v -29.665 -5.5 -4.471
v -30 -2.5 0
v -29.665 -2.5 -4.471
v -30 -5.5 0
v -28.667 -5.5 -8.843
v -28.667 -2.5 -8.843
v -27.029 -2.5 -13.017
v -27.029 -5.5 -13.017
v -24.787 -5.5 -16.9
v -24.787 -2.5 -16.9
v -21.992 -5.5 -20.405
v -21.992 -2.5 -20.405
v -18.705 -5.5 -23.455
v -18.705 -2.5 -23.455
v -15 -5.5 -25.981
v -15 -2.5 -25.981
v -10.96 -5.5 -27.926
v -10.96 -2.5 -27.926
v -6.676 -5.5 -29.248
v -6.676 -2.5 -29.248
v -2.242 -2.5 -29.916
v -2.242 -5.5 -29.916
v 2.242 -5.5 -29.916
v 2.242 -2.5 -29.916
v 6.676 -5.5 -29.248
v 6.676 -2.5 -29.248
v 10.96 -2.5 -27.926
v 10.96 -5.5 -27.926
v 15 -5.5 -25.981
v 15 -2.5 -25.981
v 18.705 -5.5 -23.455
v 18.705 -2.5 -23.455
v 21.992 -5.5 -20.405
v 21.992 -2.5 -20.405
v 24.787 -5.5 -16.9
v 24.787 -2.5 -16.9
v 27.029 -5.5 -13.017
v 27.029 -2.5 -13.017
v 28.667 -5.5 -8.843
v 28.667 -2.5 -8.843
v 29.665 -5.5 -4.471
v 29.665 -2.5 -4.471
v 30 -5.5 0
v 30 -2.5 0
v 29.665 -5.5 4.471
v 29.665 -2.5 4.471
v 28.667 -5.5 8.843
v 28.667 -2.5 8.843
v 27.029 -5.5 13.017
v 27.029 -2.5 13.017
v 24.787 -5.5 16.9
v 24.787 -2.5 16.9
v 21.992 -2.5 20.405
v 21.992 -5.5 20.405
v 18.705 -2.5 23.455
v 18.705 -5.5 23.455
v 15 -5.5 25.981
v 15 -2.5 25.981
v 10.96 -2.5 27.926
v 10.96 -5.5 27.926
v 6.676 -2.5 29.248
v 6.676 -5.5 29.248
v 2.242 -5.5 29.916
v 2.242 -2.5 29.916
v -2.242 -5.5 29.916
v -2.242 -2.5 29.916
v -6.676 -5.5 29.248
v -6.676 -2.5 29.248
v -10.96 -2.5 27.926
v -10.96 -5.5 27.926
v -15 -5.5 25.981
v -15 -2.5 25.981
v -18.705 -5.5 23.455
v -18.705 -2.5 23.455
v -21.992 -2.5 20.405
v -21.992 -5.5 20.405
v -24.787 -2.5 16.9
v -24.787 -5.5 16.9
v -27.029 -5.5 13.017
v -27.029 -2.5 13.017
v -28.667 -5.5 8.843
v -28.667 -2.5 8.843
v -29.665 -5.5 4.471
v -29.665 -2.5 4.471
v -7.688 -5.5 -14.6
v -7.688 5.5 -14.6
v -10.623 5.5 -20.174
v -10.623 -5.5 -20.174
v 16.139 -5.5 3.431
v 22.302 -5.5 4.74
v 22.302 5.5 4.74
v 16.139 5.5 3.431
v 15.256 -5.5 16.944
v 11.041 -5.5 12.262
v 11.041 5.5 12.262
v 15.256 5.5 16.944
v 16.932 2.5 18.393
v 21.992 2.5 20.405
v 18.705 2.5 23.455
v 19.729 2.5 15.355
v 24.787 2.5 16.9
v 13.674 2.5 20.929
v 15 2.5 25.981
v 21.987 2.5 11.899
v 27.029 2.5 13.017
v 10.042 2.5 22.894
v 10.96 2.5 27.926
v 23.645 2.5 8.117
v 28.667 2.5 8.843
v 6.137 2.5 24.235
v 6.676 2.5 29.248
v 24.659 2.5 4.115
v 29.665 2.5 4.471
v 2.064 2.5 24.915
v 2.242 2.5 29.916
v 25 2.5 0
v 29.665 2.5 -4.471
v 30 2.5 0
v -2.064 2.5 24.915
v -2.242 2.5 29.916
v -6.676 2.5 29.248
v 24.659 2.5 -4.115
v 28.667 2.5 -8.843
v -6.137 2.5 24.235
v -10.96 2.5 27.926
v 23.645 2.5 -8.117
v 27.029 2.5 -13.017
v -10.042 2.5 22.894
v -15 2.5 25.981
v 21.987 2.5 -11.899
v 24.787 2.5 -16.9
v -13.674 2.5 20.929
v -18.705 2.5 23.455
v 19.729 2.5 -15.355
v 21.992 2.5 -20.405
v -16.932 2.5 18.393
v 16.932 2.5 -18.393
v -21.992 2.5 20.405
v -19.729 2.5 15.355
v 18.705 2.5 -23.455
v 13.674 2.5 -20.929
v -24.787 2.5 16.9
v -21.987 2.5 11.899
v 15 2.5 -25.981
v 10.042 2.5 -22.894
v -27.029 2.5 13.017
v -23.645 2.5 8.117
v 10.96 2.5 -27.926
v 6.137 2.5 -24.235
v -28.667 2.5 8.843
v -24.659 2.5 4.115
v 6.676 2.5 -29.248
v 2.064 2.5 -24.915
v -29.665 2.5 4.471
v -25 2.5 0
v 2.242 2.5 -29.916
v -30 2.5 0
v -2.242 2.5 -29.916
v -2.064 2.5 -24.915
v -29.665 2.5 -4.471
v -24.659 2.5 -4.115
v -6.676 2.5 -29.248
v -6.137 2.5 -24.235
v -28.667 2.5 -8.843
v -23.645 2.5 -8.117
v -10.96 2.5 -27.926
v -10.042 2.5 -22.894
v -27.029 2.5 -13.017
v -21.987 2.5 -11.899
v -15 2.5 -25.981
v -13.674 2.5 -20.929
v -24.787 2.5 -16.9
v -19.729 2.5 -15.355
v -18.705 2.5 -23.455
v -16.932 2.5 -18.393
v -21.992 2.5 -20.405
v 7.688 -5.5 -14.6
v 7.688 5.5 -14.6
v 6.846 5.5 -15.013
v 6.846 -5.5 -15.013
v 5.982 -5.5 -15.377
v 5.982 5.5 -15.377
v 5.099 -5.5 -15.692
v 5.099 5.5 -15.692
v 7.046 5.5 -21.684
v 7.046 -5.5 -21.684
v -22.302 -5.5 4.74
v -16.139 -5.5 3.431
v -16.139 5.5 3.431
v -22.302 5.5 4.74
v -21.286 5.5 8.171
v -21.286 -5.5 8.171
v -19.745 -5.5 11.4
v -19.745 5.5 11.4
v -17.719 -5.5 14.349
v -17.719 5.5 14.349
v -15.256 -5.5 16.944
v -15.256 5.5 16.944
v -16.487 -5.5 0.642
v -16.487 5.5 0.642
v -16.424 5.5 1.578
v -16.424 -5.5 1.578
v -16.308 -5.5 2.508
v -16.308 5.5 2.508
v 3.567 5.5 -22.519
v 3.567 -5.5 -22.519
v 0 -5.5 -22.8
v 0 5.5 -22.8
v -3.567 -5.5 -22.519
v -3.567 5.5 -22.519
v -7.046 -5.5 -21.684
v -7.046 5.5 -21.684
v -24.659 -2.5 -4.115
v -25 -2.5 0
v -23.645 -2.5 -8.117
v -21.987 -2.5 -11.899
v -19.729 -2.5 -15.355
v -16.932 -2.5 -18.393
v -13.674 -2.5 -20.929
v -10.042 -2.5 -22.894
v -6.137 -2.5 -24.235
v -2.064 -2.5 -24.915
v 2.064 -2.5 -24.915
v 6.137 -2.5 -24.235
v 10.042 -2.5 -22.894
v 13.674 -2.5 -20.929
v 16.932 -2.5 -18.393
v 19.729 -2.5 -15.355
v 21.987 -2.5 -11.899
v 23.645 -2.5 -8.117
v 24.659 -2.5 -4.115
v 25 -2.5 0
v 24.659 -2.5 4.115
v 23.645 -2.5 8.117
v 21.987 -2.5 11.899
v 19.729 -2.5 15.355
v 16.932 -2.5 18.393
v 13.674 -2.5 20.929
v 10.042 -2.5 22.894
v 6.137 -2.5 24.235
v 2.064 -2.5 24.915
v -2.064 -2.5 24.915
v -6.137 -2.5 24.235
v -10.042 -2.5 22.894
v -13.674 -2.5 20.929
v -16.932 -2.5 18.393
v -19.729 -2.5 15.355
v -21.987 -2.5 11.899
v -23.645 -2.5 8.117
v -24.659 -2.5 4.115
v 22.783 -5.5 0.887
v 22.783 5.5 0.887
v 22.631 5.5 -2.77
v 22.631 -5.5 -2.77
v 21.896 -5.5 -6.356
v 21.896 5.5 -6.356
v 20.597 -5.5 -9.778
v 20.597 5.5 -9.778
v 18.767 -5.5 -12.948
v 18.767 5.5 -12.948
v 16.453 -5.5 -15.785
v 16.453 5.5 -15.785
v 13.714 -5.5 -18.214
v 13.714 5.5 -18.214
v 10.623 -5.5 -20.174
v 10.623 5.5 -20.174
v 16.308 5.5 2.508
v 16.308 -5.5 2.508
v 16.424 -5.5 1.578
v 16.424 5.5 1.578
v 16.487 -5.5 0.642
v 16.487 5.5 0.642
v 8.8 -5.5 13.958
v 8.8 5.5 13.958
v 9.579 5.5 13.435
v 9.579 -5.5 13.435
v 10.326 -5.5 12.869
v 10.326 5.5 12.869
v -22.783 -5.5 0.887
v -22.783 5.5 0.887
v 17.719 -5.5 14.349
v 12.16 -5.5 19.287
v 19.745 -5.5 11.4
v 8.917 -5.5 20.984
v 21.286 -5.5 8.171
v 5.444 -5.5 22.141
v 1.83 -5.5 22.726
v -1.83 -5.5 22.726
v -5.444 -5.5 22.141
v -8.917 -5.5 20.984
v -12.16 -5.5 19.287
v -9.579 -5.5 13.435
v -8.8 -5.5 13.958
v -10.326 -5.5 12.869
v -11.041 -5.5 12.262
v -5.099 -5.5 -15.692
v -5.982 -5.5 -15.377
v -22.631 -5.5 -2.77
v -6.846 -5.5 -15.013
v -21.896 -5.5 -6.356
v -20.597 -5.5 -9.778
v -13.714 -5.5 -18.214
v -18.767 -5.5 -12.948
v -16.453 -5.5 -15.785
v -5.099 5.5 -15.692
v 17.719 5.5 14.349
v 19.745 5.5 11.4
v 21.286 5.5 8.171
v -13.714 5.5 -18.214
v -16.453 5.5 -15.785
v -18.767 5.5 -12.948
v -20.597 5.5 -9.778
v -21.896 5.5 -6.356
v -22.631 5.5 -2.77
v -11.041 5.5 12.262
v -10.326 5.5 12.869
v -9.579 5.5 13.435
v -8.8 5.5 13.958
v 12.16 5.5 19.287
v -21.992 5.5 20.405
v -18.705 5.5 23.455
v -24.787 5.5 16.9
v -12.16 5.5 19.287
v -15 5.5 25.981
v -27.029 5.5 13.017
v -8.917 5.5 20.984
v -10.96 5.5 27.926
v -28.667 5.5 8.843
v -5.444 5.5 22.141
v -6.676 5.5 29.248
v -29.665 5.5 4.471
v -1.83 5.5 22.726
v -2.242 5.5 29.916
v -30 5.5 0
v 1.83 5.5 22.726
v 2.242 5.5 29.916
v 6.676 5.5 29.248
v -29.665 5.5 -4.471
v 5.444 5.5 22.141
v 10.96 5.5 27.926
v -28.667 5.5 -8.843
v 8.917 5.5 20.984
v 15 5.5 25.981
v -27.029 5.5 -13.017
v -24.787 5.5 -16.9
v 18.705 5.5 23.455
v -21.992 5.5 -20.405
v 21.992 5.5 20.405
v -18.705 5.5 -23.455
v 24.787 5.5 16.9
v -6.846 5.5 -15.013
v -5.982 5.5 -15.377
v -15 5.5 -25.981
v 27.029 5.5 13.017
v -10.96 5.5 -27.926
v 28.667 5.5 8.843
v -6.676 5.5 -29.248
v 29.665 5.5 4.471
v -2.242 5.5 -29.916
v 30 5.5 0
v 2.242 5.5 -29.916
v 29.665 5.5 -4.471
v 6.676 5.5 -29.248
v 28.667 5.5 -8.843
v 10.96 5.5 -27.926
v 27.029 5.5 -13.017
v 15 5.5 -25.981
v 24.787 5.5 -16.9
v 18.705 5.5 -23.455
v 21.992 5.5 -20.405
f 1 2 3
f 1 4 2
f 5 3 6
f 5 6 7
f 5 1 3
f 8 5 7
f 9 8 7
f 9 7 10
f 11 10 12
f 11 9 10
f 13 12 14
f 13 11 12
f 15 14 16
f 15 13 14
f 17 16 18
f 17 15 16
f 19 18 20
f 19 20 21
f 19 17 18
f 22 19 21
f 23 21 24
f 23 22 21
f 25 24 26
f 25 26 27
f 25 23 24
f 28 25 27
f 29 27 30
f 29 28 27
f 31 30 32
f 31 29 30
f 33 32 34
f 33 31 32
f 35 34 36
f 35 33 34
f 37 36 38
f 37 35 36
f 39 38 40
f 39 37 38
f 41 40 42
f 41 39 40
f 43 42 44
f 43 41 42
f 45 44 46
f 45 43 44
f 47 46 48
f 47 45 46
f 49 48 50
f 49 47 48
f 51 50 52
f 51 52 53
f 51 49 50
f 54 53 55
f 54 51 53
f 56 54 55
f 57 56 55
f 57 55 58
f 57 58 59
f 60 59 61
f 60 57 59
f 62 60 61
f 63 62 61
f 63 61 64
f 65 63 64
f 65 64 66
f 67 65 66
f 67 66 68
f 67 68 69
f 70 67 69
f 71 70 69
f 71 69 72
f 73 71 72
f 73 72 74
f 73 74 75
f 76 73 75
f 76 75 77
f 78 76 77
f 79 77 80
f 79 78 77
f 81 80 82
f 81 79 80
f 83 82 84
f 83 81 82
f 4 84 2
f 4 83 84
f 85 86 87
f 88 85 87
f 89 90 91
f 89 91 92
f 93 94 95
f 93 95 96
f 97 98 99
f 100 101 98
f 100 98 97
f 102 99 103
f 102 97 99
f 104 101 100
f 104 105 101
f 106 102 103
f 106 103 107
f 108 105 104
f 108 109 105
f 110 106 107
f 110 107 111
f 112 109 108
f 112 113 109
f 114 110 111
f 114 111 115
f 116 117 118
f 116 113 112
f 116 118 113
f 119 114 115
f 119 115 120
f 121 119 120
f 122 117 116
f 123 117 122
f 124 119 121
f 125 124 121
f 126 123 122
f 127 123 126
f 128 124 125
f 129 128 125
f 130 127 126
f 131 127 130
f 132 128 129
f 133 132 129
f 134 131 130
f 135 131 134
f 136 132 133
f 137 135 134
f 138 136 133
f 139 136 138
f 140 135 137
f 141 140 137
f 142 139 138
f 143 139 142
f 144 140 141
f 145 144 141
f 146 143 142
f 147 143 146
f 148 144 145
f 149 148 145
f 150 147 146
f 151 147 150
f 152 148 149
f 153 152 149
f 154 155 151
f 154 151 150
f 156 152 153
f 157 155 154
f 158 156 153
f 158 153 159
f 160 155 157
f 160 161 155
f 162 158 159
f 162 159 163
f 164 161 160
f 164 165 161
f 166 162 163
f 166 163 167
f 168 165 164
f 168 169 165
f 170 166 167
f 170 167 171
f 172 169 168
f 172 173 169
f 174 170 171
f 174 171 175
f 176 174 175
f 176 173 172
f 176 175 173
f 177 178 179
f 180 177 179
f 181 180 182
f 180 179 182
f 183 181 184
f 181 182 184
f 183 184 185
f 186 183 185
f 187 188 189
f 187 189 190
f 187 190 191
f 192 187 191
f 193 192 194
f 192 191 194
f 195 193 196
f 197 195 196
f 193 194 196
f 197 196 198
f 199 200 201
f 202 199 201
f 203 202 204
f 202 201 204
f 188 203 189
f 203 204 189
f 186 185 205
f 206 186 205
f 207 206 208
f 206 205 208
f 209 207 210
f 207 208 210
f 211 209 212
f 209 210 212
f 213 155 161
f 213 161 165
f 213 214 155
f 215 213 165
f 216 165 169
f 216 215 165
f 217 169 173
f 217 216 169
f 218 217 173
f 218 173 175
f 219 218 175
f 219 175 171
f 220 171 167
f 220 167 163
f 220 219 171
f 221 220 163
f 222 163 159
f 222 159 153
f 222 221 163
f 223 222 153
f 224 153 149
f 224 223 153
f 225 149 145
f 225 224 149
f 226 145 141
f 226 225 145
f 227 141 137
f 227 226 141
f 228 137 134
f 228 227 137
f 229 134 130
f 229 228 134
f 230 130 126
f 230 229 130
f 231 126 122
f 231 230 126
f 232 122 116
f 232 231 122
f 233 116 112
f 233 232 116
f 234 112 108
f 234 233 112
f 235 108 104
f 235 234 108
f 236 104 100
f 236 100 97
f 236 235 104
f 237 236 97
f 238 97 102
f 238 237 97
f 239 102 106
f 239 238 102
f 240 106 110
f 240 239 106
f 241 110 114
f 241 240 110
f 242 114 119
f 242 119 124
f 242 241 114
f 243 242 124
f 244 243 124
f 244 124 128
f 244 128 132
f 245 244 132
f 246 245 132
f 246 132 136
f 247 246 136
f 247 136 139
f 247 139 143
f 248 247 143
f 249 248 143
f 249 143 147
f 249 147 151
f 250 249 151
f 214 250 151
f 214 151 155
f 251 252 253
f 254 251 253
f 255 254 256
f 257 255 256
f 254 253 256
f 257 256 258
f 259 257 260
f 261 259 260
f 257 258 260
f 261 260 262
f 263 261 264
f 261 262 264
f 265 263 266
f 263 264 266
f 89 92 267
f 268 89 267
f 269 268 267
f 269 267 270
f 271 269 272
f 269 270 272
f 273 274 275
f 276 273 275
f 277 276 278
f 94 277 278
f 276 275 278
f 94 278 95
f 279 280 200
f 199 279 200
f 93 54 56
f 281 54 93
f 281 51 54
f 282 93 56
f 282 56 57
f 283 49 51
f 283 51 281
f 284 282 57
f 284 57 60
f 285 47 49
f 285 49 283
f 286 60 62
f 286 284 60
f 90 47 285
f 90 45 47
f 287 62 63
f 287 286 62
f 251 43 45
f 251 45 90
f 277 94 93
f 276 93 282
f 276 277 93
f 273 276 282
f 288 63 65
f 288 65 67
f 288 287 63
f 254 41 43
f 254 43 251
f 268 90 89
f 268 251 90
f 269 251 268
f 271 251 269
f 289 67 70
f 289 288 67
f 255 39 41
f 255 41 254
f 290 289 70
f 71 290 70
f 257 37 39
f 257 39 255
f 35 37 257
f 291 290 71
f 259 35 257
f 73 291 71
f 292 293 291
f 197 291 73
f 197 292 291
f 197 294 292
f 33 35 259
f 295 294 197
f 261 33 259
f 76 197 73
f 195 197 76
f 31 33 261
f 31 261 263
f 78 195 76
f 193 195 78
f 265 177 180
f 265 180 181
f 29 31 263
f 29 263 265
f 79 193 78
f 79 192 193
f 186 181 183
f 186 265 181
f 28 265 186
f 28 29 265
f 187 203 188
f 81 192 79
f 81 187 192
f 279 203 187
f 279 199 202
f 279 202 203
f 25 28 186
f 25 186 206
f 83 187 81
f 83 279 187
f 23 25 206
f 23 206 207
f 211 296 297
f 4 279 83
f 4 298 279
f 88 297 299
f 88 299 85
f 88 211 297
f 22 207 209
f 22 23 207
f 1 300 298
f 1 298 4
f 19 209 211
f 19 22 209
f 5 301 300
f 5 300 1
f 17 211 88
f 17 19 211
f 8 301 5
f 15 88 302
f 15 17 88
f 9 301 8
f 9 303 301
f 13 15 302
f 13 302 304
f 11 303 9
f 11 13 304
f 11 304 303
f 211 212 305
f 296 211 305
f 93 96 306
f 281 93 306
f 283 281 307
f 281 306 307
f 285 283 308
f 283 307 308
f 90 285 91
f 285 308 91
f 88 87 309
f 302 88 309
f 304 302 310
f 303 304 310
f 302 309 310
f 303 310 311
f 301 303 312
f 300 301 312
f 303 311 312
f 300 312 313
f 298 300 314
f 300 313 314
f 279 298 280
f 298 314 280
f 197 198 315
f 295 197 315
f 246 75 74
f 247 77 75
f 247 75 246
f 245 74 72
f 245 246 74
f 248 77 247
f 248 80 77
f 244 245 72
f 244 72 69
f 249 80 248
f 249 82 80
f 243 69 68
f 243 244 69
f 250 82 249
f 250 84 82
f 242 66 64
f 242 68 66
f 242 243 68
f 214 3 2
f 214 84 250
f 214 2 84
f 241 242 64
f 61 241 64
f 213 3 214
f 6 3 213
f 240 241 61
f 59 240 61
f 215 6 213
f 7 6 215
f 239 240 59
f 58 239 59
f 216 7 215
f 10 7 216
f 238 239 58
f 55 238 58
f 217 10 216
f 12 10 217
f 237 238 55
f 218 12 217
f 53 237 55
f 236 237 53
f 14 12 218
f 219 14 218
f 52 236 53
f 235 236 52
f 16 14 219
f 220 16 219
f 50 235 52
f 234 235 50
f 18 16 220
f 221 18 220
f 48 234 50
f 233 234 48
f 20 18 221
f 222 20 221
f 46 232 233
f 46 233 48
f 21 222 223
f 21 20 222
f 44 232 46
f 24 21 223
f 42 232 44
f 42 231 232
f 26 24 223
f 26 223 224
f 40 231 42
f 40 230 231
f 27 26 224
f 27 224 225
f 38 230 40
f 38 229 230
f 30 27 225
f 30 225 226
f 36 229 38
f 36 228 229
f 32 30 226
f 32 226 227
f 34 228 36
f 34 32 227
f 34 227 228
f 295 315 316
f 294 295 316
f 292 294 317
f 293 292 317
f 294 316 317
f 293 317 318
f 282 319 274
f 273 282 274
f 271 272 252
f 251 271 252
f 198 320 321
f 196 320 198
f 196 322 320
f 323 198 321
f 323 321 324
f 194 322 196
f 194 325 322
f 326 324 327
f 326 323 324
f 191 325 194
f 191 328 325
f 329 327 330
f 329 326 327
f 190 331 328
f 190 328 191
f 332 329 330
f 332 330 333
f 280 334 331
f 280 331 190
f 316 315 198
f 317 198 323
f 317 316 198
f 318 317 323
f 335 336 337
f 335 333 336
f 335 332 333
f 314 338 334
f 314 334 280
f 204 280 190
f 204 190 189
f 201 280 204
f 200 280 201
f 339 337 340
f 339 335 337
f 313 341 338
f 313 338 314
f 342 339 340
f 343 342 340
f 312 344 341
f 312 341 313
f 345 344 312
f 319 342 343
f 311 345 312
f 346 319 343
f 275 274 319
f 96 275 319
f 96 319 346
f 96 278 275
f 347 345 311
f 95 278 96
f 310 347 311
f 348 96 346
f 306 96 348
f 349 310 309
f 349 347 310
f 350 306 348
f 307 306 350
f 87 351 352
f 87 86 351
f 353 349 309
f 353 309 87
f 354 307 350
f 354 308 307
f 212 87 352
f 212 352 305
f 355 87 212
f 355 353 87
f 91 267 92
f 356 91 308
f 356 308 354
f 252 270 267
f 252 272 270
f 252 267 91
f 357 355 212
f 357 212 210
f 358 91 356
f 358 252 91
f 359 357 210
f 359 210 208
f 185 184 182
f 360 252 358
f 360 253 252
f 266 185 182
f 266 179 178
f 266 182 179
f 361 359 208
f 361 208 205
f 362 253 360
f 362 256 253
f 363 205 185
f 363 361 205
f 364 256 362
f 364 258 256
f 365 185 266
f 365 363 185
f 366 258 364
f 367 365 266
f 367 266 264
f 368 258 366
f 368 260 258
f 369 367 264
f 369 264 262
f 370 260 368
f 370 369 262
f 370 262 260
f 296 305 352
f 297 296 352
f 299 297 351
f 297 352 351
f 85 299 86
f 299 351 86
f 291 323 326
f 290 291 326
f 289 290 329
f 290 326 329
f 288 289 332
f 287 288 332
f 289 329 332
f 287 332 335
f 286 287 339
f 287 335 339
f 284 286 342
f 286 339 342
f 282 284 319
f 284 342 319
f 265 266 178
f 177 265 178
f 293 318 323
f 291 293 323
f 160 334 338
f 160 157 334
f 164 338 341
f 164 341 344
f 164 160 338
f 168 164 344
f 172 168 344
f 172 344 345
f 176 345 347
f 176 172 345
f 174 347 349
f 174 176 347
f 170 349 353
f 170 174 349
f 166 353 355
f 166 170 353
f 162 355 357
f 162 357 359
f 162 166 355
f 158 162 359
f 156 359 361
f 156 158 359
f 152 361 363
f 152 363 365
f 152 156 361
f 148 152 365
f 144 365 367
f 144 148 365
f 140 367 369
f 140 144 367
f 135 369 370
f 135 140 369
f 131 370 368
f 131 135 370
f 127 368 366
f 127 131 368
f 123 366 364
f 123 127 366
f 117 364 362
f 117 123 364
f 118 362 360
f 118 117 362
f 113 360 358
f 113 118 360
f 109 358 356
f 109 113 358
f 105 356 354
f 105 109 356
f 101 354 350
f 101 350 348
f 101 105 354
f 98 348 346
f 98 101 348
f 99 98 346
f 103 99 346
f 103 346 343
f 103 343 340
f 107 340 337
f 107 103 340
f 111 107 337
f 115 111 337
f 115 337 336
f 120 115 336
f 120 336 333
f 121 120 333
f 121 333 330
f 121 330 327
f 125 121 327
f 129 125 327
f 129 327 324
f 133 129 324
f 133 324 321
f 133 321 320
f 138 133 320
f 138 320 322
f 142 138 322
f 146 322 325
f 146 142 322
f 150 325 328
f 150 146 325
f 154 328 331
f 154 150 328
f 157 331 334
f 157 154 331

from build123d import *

# Parameters (mm, degrees)
CUT_EXTRUDE1_REACH = 13


with BuildPart() as part:
    # Sketch2 → Revolve1 (revolve)
    with BuildSketch(Plane.XY):
        Polygon((-25, 2.5), (-25, -2.5), (-30, -2.5), (-30, -5.5), (0, -5.5), (0, 5.5), (-30, 5.5), (-30, 2.5), align=None)
    revolve(axis=Axis((0, 19.987411147, 0), (0, -1, 0)))

    # Sketch3 → Cut-Extrude1 (cut, up to next)
    with BuildSketch(Plane(origin=(0, 5.5, 0), x_dir=(1, 0, 0), z_dir=(0, 1, 0)), mode=Mode.PRIVATE) as cut_extrude1_sk1:
        with BuildLine():
            ThreePointArc((15.256177825, -16.943702021), (19.745379206, -11.4), (22.301765297, -4.740386551))
            Line((22.301765297, -4.740386551), (16.139435412, -3.430542898))
            ThreePointArc((16.139435412, -3.430542898), (16.372933017, -2.043786781), (16.487498259, -0.642184674))
            Line((16.487498259, -0.642184674), (22.782724867, -0.887382459))
            ThreePointArc((22.782724867, -0.887382459), (19.745379206, 11.4), (10.622866681, 20.174109732))
            Line((10.622866681, 20.174109732), (7.687600888, 14.599684674))
            ThreePointArc((7.687600888, 14.599684674), (6.416495236, 15.201269318), (5.098780407, 15.692432519))
            Line((5.098780407, 15.692432519), (7.045587472, 21.684088572))
            ThreePointArc((7.045587472, 21.684088572), (0, 22.8), (-7.045587472, 21.684088572))
            Line((-7.045587472, 21.684088572), (-5.098780407, 15.692432519))
            ThreePointArc((-5.098780407, 15.692432519), (-6.416495236, 15.201269318), (-7.687600888, 14.599684674))
            Line((-7.687600888, 14.599684674), (-10.622866681, 20.174109732))
            ThreePointArc((-10.622866681, 20.174109732), (-19.745379206, 11.4), (-22.782724867, -0.887382459))
            Line((-22.782724867, -0.887382459), (-16.487498259, -0.642184674))
            ThreePointArc((-16.487498259, -0.642184674), (-16.372933017, -2.043786781), (-16.139435412, -3.430542898))
            Line((-16.139435412, -3.430542898), (-22.301765297, -4.740386551))
            ThreePointArc((-22.301765297, -4.740386551), (-19.745379206, -11.4), (-15.256177825, -16.943702021))
            Line((-15.256177825, -16.943702021), (-11.040655005, -12.26188962))
            ThreePointArc((-11.040655005, -12.26188962), (-9.956437781, -13.157482537), (-8.799897372, -13.9575))
            Line((-8.799897372, -13.9575), (-12.159858186, -19.286727273))
            ThreePointArc((-12.159858186, -19.286727273), (0, -22.8), (12.159858186, -19.286727273))
            Line((12.159858186, -19.286727273), (8.799897372, -13.9575))
            ThreePointArc((8.799897372, -13.9575), (9.956437781, -13.157482537), (11.040655005, -12.26188962))
            Line((11.040655005, -12.26188962), (15.256177825, -16.943702021))
        make_face()
    cut_extrude1_tool1 = extrude(cut_extrude1_sk1.sketch, amount=-CUT_EXTRUDE1_REACH, mode=Mode.PRIVATE) & part.part
    add(cut_extrude1_tool1.solids().sort_by_distance((0, 5.5, 0))[0], mode=Mode.SUBTRACT)


solid = part.part
